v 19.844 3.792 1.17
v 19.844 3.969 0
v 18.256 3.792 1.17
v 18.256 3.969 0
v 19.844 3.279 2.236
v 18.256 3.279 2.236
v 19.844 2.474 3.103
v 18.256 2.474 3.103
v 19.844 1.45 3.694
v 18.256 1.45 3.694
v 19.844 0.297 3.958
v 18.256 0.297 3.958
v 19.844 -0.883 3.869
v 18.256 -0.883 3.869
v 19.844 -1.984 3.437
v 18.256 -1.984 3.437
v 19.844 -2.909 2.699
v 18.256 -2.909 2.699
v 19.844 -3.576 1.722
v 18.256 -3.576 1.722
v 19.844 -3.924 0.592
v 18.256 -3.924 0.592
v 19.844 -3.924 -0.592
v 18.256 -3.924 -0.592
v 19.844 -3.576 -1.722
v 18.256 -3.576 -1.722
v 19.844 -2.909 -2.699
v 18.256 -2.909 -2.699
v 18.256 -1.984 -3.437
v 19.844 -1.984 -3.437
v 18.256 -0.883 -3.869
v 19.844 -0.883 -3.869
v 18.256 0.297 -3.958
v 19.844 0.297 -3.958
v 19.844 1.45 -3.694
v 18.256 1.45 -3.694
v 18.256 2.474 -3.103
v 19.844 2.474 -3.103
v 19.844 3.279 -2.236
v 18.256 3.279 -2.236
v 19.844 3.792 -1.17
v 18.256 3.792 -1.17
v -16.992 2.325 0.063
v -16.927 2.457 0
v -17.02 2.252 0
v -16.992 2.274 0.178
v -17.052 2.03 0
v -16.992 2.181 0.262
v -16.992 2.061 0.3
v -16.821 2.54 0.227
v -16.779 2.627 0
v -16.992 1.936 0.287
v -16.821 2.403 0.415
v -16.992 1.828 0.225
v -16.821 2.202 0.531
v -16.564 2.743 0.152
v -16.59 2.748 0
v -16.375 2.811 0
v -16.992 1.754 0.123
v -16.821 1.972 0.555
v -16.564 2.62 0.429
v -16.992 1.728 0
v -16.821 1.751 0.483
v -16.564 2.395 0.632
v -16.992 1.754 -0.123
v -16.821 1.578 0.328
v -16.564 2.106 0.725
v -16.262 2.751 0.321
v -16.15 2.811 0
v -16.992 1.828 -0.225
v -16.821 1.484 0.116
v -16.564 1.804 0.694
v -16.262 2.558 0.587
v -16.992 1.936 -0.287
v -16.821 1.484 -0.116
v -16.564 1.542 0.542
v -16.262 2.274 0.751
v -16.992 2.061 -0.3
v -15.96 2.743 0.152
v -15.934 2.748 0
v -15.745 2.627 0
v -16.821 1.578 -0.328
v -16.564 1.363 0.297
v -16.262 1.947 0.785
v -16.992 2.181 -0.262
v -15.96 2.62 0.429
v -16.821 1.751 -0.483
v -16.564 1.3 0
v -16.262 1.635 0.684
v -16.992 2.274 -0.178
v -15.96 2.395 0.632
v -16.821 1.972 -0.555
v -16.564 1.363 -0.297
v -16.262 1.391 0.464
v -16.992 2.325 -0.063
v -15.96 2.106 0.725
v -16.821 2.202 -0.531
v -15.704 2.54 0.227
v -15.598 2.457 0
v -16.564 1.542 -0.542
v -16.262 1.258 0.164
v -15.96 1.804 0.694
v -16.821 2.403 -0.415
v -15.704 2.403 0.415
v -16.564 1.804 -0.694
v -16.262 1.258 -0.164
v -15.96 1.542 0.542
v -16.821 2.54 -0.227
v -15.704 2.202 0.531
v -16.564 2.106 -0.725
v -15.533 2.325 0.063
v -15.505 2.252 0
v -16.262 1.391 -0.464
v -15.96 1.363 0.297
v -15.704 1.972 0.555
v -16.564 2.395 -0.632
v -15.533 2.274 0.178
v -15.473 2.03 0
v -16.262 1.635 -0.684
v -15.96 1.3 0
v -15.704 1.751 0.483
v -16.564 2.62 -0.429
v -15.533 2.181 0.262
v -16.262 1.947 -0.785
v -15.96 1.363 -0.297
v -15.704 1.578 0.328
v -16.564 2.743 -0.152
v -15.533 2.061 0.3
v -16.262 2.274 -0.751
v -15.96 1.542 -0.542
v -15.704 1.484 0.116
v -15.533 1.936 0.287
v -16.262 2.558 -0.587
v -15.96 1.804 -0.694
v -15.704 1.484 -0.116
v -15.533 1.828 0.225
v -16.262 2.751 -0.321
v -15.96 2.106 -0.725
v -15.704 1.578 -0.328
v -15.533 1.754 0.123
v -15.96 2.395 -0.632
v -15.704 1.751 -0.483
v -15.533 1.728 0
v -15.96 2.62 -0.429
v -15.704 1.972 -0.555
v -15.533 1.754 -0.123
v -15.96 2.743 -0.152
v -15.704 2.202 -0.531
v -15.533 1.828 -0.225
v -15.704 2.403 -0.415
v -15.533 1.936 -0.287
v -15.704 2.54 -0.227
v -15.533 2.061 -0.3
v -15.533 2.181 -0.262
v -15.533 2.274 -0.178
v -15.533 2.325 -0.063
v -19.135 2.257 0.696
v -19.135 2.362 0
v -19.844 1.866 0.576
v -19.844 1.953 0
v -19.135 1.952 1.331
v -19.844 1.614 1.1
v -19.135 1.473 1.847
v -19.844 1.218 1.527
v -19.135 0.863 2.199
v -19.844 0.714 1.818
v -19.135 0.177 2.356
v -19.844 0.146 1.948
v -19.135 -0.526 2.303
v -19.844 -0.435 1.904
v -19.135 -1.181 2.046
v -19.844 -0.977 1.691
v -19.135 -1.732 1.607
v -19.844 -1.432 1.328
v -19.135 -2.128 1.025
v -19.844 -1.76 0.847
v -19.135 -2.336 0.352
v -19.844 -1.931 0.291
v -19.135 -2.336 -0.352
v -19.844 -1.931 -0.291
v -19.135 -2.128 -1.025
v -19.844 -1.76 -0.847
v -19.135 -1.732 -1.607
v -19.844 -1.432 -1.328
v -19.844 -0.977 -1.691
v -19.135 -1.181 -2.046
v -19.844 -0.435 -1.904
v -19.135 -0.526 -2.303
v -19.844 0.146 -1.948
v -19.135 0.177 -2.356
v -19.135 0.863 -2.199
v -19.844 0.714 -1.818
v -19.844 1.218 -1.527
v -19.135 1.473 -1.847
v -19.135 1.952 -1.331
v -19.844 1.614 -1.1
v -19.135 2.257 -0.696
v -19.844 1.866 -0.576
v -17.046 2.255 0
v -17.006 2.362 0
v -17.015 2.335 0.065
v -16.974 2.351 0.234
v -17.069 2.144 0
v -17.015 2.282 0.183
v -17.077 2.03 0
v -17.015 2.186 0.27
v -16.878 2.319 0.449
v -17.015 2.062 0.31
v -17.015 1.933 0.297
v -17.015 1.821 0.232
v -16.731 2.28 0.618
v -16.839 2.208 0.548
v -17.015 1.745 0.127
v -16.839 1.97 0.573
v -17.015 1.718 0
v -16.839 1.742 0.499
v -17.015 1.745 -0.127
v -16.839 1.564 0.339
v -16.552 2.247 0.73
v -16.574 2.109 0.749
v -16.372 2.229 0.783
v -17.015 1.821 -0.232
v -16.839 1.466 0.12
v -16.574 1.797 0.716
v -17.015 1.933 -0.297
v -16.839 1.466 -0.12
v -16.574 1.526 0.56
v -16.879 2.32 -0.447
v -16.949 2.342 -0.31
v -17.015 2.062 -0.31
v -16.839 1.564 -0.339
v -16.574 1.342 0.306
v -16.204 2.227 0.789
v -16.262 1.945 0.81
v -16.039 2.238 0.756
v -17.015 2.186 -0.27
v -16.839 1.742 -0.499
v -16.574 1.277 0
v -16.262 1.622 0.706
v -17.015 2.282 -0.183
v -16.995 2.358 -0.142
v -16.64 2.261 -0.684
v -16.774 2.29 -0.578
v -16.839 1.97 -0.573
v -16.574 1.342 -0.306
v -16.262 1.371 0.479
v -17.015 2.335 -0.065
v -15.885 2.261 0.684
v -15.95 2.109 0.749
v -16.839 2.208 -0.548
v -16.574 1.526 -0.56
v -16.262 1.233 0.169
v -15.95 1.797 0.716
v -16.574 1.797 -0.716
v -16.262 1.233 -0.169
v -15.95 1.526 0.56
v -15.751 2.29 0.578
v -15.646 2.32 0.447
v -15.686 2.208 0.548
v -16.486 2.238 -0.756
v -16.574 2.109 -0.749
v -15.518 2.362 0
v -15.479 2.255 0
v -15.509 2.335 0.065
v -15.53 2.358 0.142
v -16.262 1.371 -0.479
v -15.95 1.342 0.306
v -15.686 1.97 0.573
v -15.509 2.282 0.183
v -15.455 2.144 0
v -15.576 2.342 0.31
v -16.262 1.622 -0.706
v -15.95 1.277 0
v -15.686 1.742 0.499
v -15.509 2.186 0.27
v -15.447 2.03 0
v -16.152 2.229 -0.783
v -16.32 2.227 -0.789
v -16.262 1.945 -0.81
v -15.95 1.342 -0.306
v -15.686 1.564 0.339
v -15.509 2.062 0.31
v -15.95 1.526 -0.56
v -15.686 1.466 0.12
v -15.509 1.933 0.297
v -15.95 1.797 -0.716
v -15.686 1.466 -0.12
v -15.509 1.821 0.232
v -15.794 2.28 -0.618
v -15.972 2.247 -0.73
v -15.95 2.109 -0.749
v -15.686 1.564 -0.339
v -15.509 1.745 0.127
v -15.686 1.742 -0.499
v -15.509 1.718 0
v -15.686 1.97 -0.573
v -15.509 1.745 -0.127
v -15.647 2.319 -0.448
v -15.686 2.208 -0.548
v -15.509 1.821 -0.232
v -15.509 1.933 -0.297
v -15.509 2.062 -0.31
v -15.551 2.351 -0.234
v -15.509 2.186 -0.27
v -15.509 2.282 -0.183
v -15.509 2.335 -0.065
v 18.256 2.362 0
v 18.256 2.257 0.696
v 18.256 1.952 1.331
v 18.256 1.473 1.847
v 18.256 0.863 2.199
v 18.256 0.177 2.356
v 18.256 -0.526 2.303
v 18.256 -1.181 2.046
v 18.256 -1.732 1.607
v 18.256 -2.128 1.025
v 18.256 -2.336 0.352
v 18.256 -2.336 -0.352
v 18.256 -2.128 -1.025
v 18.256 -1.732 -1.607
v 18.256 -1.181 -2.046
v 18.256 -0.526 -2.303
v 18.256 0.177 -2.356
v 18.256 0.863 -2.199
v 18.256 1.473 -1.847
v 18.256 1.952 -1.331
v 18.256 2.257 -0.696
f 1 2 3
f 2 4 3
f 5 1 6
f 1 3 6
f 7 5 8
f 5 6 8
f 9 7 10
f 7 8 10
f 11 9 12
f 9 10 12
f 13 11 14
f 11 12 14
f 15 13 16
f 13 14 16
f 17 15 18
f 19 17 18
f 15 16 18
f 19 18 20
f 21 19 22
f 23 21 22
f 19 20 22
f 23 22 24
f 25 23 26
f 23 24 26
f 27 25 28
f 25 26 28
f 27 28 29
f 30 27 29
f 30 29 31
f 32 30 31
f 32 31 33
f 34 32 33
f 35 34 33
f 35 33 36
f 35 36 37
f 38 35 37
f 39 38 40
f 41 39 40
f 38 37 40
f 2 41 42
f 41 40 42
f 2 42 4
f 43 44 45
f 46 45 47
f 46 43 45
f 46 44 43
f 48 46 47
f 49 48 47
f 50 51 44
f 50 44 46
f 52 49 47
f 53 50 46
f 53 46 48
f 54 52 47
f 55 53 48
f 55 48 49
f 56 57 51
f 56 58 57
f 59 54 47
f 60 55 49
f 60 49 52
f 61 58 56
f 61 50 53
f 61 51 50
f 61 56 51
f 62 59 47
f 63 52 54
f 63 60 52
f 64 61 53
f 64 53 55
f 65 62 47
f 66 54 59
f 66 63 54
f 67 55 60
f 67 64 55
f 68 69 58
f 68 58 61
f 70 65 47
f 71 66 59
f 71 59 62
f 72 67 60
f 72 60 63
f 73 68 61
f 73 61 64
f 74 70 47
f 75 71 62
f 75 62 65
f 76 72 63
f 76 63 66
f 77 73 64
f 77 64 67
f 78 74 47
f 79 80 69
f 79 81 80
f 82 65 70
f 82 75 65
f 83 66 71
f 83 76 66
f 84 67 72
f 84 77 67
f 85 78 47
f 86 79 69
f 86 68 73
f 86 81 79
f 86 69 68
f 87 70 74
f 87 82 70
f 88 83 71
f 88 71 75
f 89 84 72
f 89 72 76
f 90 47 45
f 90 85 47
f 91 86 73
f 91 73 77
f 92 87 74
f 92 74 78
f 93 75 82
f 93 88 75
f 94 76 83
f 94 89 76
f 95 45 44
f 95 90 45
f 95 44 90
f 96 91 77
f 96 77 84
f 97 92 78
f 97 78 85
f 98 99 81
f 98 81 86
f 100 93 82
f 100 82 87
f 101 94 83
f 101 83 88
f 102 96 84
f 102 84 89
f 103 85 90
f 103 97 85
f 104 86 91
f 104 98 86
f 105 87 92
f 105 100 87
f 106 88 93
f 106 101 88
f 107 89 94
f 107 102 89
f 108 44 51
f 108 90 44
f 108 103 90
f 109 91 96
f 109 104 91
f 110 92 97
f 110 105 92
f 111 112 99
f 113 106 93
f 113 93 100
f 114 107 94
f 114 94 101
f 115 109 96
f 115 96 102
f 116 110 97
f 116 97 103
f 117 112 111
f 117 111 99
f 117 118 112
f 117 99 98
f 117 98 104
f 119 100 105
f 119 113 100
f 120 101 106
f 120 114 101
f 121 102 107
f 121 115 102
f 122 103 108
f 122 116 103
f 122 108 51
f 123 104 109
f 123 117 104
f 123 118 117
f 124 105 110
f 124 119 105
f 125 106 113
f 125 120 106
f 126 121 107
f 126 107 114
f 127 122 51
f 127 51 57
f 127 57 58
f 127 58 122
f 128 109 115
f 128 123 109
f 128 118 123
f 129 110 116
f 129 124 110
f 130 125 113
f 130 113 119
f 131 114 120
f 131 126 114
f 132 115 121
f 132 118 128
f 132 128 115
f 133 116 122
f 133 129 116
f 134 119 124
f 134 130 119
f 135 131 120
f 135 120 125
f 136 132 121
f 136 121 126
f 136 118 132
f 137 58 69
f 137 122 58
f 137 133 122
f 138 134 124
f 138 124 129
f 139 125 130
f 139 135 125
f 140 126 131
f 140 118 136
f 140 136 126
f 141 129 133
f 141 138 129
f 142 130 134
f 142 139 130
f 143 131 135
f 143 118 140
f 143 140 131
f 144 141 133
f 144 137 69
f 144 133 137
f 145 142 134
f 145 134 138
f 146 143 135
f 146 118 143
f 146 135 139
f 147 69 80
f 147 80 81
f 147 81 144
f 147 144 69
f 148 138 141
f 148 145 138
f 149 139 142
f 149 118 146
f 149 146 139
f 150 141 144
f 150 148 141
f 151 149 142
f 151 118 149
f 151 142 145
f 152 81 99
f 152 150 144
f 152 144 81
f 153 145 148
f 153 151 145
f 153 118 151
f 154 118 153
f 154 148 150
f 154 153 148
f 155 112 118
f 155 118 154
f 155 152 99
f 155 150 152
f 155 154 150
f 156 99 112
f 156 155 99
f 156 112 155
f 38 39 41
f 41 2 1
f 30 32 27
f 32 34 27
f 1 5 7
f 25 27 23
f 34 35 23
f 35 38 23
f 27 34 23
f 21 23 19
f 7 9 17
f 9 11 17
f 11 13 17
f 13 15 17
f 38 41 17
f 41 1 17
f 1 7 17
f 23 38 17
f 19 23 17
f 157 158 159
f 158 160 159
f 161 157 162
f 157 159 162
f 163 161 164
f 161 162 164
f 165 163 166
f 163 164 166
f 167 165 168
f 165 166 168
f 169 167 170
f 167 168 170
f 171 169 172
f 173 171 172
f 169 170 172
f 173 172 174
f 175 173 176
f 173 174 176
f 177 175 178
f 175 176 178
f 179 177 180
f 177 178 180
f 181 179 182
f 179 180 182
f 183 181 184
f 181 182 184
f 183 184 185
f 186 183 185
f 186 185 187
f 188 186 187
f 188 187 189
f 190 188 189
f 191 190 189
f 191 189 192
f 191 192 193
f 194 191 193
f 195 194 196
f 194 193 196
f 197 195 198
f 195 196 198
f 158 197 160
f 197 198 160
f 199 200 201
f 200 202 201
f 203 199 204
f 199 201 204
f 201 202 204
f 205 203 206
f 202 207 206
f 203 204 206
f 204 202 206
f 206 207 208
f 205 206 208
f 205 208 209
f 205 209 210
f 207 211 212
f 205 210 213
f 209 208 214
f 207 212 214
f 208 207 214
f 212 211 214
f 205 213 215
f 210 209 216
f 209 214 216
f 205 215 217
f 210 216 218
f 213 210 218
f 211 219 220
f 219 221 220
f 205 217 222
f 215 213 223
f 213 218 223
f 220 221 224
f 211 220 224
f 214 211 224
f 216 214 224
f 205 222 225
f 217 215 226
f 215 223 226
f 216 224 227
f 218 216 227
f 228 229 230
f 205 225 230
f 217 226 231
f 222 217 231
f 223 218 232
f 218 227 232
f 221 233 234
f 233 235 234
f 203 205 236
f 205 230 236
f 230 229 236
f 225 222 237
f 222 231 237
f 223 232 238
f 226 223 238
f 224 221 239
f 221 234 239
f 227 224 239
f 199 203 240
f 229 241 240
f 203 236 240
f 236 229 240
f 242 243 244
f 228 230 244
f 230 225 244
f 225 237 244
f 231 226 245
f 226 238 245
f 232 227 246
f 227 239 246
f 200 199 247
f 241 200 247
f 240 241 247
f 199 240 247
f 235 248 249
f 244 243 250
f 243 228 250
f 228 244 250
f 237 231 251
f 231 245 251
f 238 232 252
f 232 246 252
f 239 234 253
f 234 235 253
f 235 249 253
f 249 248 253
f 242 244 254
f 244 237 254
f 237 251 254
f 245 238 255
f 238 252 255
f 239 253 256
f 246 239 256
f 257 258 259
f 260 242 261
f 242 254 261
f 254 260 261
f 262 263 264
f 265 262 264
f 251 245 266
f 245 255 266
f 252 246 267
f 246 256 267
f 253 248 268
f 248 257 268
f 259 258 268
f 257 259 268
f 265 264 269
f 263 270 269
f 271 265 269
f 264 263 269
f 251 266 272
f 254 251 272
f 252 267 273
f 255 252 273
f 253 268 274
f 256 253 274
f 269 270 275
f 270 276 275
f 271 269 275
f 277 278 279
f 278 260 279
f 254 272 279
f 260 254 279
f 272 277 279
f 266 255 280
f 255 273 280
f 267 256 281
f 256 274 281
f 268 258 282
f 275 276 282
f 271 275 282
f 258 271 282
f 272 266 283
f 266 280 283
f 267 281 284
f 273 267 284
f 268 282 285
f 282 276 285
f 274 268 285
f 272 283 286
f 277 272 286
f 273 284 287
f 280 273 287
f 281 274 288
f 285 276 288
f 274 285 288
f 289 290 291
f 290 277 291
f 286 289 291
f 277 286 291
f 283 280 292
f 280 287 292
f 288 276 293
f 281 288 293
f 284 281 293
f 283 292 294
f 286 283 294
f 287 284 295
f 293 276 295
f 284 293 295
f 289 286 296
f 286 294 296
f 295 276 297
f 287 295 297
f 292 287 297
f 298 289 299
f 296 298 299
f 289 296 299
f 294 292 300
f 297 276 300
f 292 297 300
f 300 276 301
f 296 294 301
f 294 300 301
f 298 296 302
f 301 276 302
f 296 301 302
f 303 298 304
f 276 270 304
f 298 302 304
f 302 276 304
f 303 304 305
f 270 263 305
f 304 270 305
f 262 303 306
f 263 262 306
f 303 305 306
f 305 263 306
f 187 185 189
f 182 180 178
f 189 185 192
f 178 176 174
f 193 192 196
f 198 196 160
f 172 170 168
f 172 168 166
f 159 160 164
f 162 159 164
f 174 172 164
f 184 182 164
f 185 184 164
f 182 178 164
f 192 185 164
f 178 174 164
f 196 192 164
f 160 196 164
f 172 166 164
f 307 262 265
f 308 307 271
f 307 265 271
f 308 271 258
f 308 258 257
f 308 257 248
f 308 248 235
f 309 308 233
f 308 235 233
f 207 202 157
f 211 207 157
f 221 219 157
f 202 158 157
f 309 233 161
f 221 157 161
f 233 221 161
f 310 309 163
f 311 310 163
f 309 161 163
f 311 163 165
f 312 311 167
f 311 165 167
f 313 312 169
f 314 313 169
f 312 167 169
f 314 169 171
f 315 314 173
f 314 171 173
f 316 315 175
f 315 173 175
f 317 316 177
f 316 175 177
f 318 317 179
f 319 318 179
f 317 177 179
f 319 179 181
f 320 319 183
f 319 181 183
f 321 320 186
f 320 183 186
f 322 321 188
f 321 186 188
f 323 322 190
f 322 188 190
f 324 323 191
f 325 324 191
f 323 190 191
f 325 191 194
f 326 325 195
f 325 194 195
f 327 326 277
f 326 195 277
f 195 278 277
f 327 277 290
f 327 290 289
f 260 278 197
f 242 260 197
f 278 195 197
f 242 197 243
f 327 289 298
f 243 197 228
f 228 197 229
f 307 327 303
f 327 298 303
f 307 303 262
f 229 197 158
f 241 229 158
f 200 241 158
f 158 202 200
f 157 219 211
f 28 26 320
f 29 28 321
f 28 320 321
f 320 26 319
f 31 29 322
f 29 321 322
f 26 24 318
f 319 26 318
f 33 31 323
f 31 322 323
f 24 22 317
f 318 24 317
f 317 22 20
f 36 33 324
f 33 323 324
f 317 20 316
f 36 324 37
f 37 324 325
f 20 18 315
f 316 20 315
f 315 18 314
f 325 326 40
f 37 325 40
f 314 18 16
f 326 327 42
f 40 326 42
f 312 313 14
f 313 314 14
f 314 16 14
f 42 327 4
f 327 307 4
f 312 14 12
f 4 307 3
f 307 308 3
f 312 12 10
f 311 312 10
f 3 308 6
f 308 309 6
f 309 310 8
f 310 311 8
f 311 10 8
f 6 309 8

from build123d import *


with BuildPart() as part:
    # Sketch1 → Revolve1 (revolve)
    with BuildSketch(Plane.XY):
        Polygon((19.84375, 3.96875), (18.25625, 3.96875), (18.25625, 2.3622), (-19.13509, 2.3622), (-19.84375, 1.953054958), (-19.84375, 0), (19.84375, 0), align=None)
    revolve(axis=Axis((-19.84375, 0, 0), (1, 0, 0)))

    # Sketch2 → Cut-Revolve1 (revolve, cut)
    with BuildSketch(Plane.XY):
        with BuildLine():
            Line((-15.447407306, 2.029857306), (-17.077292694, 2.029857306))
            ThreePointArc((-17.077292694, 2.029857306), (-16.26235, 2.8448), (-15.447407306, 2.029857306))
        make_face()
    revolve(axis=Axis((-15.447407306, 2.029857306, 0), (1, 0, 0)), mode=Mode.SUBTRACT)


with BuildPart() as body_2:
    # Sketch3 → Revolve2 (revolve)
    with BuildSketch(Plane.XY):
        with BuildLine():
            Line((-15.472807306, 2.029857306), (-17.051892694, 2.029857306))
            ThreePointArc((-17.051892694, 2.029857306), (-16.26235, 2.8194), (-15.472807306, 2.029857306))
        make_face()
    revolve(axis=Axis((-15.472807306, 2.029857306, 0), (1, 0, 0)))


solid = Compound([part.part, body_2.part])
